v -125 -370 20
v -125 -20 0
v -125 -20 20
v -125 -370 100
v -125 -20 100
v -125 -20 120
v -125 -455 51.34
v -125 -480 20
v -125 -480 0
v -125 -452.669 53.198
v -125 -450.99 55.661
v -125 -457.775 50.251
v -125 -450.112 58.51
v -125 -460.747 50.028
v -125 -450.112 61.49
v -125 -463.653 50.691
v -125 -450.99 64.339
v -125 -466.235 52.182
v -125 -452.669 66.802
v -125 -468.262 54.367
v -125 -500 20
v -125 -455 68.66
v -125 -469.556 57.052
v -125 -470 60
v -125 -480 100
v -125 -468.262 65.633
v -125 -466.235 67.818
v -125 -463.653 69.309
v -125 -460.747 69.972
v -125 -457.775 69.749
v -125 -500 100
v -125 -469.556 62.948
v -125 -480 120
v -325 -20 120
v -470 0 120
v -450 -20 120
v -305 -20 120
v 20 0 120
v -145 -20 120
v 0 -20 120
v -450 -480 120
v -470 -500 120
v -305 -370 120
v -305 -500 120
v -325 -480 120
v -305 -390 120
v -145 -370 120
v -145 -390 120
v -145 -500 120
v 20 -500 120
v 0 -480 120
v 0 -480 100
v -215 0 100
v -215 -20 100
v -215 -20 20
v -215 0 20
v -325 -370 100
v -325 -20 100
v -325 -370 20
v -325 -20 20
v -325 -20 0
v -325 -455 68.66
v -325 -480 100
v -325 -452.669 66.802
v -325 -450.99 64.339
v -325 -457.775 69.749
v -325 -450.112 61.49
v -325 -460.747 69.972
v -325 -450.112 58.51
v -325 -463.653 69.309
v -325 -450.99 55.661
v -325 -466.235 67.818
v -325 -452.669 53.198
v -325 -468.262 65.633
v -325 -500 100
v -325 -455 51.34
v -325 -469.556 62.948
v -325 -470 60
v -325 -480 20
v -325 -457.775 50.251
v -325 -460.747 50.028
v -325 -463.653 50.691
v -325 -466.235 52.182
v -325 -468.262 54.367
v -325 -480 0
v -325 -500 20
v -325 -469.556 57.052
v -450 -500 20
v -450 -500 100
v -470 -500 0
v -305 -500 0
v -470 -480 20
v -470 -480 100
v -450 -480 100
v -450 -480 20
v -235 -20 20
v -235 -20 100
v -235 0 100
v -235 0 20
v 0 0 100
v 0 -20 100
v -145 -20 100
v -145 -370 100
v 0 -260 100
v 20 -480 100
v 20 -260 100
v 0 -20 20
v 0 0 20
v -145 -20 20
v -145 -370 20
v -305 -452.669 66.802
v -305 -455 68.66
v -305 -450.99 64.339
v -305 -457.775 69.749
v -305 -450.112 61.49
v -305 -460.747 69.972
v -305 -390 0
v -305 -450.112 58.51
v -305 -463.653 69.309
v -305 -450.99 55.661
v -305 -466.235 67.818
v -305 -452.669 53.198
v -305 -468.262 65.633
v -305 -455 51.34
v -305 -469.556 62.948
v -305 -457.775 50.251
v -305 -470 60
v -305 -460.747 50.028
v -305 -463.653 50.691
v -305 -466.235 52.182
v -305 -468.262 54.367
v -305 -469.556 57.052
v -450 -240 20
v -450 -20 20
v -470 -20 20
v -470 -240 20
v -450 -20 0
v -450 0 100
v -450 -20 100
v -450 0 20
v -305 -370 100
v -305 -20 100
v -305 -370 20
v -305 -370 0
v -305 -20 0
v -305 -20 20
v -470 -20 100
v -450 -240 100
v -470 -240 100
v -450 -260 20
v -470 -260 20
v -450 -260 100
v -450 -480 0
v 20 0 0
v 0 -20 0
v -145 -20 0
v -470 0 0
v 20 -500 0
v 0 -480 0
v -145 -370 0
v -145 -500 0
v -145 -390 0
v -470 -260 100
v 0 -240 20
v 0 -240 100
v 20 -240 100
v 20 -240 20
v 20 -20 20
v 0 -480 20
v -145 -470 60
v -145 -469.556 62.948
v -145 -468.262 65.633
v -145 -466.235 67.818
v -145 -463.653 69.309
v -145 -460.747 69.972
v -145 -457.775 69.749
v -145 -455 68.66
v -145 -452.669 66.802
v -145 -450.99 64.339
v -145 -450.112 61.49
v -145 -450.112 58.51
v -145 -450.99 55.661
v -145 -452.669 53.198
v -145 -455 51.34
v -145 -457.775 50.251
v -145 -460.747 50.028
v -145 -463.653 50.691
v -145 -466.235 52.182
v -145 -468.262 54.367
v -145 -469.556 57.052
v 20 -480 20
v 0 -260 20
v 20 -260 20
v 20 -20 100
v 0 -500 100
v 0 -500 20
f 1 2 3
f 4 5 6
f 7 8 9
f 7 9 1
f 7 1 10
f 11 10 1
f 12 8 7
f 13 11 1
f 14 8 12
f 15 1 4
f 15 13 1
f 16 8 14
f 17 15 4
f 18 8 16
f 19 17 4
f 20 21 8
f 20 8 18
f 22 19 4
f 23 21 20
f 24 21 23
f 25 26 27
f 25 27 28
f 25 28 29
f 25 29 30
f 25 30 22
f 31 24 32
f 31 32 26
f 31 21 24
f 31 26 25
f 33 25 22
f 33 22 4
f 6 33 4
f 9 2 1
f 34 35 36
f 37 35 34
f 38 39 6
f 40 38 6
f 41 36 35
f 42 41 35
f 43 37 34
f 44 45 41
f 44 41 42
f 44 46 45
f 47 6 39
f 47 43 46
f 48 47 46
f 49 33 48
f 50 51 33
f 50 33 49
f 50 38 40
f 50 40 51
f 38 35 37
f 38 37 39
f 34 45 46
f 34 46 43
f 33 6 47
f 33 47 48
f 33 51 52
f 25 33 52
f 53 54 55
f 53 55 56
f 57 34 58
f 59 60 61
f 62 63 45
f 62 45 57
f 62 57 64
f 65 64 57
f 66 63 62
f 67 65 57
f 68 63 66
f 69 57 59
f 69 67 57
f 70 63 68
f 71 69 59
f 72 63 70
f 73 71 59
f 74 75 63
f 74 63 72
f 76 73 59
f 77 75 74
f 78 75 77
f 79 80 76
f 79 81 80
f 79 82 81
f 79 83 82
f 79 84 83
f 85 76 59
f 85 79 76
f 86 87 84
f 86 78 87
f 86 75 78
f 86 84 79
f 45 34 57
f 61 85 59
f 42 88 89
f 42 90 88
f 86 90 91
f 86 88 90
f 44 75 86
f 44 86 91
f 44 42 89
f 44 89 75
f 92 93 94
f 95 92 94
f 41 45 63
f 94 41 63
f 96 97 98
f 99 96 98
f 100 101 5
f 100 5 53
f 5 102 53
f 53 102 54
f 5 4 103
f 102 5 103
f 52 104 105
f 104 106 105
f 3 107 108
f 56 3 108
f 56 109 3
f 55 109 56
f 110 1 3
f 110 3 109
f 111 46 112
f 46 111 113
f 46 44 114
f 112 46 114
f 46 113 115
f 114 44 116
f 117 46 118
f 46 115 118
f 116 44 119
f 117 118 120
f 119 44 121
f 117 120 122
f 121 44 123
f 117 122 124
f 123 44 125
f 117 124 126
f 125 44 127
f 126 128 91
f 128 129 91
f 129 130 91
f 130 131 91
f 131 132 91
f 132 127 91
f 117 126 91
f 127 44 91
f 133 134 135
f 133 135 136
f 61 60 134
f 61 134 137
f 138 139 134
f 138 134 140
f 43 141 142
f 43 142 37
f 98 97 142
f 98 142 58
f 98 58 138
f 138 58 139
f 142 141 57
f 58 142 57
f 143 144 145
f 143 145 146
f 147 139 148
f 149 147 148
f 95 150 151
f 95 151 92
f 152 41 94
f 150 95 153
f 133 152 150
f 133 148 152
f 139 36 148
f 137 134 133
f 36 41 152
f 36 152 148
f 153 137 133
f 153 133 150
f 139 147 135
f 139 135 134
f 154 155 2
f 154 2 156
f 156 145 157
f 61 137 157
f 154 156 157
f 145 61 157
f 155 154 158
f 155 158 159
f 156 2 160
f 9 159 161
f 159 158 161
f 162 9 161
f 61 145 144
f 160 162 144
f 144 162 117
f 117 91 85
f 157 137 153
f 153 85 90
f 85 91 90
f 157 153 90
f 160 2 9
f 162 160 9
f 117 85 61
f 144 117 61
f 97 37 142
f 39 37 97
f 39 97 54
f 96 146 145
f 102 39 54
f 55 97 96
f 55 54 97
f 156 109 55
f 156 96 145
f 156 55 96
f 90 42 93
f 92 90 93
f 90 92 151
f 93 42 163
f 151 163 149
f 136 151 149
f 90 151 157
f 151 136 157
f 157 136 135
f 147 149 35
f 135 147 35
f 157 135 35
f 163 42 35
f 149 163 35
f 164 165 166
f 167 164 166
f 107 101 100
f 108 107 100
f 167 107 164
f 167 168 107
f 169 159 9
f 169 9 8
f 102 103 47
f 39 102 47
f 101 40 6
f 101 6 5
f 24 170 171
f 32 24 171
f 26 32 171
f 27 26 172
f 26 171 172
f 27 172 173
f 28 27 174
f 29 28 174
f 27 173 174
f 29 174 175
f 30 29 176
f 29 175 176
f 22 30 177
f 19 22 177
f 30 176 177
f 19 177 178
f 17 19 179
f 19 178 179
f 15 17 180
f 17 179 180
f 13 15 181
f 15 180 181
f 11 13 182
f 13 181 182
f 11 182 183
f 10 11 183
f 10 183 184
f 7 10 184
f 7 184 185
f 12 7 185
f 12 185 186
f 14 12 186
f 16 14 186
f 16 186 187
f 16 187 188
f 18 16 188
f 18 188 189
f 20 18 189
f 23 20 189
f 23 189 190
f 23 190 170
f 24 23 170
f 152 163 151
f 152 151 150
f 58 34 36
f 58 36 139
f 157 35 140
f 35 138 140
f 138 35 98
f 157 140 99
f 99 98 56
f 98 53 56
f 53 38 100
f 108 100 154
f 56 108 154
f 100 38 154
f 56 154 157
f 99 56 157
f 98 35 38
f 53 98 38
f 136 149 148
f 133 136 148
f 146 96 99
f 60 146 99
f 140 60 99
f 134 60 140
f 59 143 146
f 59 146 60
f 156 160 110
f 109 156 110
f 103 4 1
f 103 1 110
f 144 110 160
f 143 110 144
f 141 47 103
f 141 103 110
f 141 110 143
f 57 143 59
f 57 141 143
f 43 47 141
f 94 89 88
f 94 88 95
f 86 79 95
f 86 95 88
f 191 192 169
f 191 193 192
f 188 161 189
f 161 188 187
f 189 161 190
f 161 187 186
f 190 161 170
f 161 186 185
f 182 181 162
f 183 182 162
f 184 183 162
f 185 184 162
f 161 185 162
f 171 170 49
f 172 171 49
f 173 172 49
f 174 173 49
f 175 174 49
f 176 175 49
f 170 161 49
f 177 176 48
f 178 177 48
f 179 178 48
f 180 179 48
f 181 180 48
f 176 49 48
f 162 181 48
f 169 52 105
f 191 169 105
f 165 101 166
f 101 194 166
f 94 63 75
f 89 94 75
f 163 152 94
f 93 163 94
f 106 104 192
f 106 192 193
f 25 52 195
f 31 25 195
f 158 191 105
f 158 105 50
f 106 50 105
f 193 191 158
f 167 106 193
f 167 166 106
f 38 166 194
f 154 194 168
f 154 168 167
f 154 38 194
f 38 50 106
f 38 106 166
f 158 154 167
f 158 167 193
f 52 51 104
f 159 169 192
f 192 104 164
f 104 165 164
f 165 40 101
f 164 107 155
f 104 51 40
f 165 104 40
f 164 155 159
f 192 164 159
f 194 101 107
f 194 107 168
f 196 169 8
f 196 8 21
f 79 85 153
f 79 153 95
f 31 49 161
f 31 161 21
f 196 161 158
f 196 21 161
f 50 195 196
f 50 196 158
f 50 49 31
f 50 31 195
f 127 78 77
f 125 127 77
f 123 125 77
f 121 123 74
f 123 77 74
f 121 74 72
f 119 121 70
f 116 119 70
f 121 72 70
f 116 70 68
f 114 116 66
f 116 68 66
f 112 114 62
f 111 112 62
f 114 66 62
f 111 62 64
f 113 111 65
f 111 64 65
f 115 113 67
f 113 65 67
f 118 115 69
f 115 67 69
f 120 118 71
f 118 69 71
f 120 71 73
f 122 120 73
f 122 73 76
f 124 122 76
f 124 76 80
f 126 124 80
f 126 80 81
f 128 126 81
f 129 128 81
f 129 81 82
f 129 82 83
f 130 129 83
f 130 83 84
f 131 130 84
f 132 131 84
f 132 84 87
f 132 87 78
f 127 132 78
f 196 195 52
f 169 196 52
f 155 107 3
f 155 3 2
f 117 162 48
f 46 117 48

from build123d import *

# Parameters (mm, degrees)
F0_W      = 20
F0_H      = 20
F1_DEPTH  = 500
F2_W      = 20
F2_H      = 20
F3_DEPTH  = 470
F4_W      = 20
F4_H      = 20
F5_DEPTH  = 460
F6_W      = 20
F6_H      = 20
F7_DEPTH  = 110
F8_W      = 20
F8_H      = 20
F9_DEPTH  = 160
F10_W     = 20
F10_H     = 20
F10_H_2   = 130
F11_DEPTH = 40
F13_W     = 160
F13_H     = 20
F14_DEPTH = 120.001
F16_D     = 20
F16_DEPTH = 250
F16_TIP   = 6.0086061903
F17_W     = 160
F17_H     = 80
F18_DEPTH = 20
F19_W     = 20
F19_H     = 20
F20_DEPTH = 350


with BuildPart() as f1:
    # F0 (on Front) → F1 (new body)
    with BuildSketch(Plane.XZ):
        with Locations((10, 10)):
            Rectangle(F0_W, F0_H)
    extrude(amount=F1_DEPTH)

    # F2 (on face) → F3 (join)
    with BuildSketch(Plane(origin=(0, 0, 0), x_dir=(0, -1, 0), z_dir=(-1, 0, 0))):
        with Locations((10, 10)):
            Rectangle(F2_W, F2_H)
        with Locations((490, 10)):
            Rectangle(F2_W, F2_H)
    extrude(amount=F3_DEPTH)

    # F4 (on face) → F5 (join, through all)
    with BuildSketch(Plane.XZ.offset(20)):
        with Locations((-460, 10)):
            Rectangle(F4_W, F4_H)
    extrude(amount=F5_DEPTH)

    # F6 (on face) → F7 (join)
    with BuildSketch(Plane(origin=(0, -480, 0), x_dir=(-1, 0, 0), z_dir=(0, 1, 0))):
        with Locations((135, 10)):
            Rectangle(F6_W, F6_H)
        with Locations((315, 10)):
            Rectangle(F6_W, F6_H)
    extrude(amount=F7_DEPTH)

    # F8 (on face) → F9 (join, through all)
    with BuildSketch(Plane(origin=(-145, 0, 0), x_dir=(0, -1, 0), z_dir=(-1, 0, 0))):
        with Locations((380, 10)):
            Rectangle(F8_W, F8_H)
    extrude(amount=F9_DEPTH)

    # F10 (on face) → F11 (join)
    with BuildSketch(Plane.XY.offset(20)):
        with Locations((-460, -490)):
            Rectangle(F10_W, F10_H)
        with Locations((10, -490)):
            Rectangle(F10_W, F10_H)
        with Locations((-460, -10)):
            Rectangle(F10_W, F10_H)
        with Locations((10, -10)):
            Rectangle(F10_W, F10_H)
        with Locations((10, -250)):
            Rectangle(F10_W, F10_H)
        with Locations((-460, -250)):
            Rectangle(F10_W, F10_H)
        with Locations((-315, -435)):
            Rectangle(F10_W, F10_H_2)
        with Locations((-135, -435)):
            Rectangle(F10_W, F10_H_2)
        with Locations((-225, -10)):
            Rectangle(F10_W, F10_H)
    extrude(amount=F11_DEPTH)

    # F12: F1 across face


with BuildPart() as f1_1:
    add(f1.part)
    add(f1.part.mirror(Plane(origin=(10, -10, 60), x_dir=(1, 0, 0), z_dir=(0, 0, 1))))

    # F13 (on face) → F14 (cut, through all)
    with BuildSketch(Plane.XY.offset(120)):
        with Locations((-225, -490)):
            Rectangle(F13_W, F13_H)
    extrude(amount=-F14_DEPTH, mode=Mode.SUBTRACT)

    # F16
    with Locations(Plane.YZ.offset(-125)):
        with Locations((-460, 60)):
            Hole(F16_D / 2, depth=F16_DEPTH)
            with Locations((0, 0, -(F16_DEPTH + F16_TIP / 2))):  # 118° drill point
                Cone(0, F16_D / 2, F16_TIP, mode=Mode.SUBTRACT)

    # F17 (on face) → F18 (join)
    with BuildSketch(Plane(origin=(0, -370, 0), x_dir=(-1, 0, 0), z_dir=(0, 1, 0))):
        with Locations((225, 60)):
            Rectangle(F17_W, F17_H)
    extrude(amount=-F18_DEPTH)

    # F19 (on face) → F20 (join, through all)
    with BuildSketch(Plane(origin=(0, -370, 0), x_dir=(-1, 0, 0), z_dir=(0, 1, 0))):
        with Locations((135, 10)):
            Rectangle(F19_W, F19_H)
        with Locations((315, 10)):
            Rectangle(F19_W, F19_H)
        with Locations((315, 110)):
            Rectangle(F19_W, F19_H)
        with Locations((135, 110)):
            Rectangle(F19_W, F19_H)
    extrude(amount=F20_DEPTH)


solid = f1_1.part
